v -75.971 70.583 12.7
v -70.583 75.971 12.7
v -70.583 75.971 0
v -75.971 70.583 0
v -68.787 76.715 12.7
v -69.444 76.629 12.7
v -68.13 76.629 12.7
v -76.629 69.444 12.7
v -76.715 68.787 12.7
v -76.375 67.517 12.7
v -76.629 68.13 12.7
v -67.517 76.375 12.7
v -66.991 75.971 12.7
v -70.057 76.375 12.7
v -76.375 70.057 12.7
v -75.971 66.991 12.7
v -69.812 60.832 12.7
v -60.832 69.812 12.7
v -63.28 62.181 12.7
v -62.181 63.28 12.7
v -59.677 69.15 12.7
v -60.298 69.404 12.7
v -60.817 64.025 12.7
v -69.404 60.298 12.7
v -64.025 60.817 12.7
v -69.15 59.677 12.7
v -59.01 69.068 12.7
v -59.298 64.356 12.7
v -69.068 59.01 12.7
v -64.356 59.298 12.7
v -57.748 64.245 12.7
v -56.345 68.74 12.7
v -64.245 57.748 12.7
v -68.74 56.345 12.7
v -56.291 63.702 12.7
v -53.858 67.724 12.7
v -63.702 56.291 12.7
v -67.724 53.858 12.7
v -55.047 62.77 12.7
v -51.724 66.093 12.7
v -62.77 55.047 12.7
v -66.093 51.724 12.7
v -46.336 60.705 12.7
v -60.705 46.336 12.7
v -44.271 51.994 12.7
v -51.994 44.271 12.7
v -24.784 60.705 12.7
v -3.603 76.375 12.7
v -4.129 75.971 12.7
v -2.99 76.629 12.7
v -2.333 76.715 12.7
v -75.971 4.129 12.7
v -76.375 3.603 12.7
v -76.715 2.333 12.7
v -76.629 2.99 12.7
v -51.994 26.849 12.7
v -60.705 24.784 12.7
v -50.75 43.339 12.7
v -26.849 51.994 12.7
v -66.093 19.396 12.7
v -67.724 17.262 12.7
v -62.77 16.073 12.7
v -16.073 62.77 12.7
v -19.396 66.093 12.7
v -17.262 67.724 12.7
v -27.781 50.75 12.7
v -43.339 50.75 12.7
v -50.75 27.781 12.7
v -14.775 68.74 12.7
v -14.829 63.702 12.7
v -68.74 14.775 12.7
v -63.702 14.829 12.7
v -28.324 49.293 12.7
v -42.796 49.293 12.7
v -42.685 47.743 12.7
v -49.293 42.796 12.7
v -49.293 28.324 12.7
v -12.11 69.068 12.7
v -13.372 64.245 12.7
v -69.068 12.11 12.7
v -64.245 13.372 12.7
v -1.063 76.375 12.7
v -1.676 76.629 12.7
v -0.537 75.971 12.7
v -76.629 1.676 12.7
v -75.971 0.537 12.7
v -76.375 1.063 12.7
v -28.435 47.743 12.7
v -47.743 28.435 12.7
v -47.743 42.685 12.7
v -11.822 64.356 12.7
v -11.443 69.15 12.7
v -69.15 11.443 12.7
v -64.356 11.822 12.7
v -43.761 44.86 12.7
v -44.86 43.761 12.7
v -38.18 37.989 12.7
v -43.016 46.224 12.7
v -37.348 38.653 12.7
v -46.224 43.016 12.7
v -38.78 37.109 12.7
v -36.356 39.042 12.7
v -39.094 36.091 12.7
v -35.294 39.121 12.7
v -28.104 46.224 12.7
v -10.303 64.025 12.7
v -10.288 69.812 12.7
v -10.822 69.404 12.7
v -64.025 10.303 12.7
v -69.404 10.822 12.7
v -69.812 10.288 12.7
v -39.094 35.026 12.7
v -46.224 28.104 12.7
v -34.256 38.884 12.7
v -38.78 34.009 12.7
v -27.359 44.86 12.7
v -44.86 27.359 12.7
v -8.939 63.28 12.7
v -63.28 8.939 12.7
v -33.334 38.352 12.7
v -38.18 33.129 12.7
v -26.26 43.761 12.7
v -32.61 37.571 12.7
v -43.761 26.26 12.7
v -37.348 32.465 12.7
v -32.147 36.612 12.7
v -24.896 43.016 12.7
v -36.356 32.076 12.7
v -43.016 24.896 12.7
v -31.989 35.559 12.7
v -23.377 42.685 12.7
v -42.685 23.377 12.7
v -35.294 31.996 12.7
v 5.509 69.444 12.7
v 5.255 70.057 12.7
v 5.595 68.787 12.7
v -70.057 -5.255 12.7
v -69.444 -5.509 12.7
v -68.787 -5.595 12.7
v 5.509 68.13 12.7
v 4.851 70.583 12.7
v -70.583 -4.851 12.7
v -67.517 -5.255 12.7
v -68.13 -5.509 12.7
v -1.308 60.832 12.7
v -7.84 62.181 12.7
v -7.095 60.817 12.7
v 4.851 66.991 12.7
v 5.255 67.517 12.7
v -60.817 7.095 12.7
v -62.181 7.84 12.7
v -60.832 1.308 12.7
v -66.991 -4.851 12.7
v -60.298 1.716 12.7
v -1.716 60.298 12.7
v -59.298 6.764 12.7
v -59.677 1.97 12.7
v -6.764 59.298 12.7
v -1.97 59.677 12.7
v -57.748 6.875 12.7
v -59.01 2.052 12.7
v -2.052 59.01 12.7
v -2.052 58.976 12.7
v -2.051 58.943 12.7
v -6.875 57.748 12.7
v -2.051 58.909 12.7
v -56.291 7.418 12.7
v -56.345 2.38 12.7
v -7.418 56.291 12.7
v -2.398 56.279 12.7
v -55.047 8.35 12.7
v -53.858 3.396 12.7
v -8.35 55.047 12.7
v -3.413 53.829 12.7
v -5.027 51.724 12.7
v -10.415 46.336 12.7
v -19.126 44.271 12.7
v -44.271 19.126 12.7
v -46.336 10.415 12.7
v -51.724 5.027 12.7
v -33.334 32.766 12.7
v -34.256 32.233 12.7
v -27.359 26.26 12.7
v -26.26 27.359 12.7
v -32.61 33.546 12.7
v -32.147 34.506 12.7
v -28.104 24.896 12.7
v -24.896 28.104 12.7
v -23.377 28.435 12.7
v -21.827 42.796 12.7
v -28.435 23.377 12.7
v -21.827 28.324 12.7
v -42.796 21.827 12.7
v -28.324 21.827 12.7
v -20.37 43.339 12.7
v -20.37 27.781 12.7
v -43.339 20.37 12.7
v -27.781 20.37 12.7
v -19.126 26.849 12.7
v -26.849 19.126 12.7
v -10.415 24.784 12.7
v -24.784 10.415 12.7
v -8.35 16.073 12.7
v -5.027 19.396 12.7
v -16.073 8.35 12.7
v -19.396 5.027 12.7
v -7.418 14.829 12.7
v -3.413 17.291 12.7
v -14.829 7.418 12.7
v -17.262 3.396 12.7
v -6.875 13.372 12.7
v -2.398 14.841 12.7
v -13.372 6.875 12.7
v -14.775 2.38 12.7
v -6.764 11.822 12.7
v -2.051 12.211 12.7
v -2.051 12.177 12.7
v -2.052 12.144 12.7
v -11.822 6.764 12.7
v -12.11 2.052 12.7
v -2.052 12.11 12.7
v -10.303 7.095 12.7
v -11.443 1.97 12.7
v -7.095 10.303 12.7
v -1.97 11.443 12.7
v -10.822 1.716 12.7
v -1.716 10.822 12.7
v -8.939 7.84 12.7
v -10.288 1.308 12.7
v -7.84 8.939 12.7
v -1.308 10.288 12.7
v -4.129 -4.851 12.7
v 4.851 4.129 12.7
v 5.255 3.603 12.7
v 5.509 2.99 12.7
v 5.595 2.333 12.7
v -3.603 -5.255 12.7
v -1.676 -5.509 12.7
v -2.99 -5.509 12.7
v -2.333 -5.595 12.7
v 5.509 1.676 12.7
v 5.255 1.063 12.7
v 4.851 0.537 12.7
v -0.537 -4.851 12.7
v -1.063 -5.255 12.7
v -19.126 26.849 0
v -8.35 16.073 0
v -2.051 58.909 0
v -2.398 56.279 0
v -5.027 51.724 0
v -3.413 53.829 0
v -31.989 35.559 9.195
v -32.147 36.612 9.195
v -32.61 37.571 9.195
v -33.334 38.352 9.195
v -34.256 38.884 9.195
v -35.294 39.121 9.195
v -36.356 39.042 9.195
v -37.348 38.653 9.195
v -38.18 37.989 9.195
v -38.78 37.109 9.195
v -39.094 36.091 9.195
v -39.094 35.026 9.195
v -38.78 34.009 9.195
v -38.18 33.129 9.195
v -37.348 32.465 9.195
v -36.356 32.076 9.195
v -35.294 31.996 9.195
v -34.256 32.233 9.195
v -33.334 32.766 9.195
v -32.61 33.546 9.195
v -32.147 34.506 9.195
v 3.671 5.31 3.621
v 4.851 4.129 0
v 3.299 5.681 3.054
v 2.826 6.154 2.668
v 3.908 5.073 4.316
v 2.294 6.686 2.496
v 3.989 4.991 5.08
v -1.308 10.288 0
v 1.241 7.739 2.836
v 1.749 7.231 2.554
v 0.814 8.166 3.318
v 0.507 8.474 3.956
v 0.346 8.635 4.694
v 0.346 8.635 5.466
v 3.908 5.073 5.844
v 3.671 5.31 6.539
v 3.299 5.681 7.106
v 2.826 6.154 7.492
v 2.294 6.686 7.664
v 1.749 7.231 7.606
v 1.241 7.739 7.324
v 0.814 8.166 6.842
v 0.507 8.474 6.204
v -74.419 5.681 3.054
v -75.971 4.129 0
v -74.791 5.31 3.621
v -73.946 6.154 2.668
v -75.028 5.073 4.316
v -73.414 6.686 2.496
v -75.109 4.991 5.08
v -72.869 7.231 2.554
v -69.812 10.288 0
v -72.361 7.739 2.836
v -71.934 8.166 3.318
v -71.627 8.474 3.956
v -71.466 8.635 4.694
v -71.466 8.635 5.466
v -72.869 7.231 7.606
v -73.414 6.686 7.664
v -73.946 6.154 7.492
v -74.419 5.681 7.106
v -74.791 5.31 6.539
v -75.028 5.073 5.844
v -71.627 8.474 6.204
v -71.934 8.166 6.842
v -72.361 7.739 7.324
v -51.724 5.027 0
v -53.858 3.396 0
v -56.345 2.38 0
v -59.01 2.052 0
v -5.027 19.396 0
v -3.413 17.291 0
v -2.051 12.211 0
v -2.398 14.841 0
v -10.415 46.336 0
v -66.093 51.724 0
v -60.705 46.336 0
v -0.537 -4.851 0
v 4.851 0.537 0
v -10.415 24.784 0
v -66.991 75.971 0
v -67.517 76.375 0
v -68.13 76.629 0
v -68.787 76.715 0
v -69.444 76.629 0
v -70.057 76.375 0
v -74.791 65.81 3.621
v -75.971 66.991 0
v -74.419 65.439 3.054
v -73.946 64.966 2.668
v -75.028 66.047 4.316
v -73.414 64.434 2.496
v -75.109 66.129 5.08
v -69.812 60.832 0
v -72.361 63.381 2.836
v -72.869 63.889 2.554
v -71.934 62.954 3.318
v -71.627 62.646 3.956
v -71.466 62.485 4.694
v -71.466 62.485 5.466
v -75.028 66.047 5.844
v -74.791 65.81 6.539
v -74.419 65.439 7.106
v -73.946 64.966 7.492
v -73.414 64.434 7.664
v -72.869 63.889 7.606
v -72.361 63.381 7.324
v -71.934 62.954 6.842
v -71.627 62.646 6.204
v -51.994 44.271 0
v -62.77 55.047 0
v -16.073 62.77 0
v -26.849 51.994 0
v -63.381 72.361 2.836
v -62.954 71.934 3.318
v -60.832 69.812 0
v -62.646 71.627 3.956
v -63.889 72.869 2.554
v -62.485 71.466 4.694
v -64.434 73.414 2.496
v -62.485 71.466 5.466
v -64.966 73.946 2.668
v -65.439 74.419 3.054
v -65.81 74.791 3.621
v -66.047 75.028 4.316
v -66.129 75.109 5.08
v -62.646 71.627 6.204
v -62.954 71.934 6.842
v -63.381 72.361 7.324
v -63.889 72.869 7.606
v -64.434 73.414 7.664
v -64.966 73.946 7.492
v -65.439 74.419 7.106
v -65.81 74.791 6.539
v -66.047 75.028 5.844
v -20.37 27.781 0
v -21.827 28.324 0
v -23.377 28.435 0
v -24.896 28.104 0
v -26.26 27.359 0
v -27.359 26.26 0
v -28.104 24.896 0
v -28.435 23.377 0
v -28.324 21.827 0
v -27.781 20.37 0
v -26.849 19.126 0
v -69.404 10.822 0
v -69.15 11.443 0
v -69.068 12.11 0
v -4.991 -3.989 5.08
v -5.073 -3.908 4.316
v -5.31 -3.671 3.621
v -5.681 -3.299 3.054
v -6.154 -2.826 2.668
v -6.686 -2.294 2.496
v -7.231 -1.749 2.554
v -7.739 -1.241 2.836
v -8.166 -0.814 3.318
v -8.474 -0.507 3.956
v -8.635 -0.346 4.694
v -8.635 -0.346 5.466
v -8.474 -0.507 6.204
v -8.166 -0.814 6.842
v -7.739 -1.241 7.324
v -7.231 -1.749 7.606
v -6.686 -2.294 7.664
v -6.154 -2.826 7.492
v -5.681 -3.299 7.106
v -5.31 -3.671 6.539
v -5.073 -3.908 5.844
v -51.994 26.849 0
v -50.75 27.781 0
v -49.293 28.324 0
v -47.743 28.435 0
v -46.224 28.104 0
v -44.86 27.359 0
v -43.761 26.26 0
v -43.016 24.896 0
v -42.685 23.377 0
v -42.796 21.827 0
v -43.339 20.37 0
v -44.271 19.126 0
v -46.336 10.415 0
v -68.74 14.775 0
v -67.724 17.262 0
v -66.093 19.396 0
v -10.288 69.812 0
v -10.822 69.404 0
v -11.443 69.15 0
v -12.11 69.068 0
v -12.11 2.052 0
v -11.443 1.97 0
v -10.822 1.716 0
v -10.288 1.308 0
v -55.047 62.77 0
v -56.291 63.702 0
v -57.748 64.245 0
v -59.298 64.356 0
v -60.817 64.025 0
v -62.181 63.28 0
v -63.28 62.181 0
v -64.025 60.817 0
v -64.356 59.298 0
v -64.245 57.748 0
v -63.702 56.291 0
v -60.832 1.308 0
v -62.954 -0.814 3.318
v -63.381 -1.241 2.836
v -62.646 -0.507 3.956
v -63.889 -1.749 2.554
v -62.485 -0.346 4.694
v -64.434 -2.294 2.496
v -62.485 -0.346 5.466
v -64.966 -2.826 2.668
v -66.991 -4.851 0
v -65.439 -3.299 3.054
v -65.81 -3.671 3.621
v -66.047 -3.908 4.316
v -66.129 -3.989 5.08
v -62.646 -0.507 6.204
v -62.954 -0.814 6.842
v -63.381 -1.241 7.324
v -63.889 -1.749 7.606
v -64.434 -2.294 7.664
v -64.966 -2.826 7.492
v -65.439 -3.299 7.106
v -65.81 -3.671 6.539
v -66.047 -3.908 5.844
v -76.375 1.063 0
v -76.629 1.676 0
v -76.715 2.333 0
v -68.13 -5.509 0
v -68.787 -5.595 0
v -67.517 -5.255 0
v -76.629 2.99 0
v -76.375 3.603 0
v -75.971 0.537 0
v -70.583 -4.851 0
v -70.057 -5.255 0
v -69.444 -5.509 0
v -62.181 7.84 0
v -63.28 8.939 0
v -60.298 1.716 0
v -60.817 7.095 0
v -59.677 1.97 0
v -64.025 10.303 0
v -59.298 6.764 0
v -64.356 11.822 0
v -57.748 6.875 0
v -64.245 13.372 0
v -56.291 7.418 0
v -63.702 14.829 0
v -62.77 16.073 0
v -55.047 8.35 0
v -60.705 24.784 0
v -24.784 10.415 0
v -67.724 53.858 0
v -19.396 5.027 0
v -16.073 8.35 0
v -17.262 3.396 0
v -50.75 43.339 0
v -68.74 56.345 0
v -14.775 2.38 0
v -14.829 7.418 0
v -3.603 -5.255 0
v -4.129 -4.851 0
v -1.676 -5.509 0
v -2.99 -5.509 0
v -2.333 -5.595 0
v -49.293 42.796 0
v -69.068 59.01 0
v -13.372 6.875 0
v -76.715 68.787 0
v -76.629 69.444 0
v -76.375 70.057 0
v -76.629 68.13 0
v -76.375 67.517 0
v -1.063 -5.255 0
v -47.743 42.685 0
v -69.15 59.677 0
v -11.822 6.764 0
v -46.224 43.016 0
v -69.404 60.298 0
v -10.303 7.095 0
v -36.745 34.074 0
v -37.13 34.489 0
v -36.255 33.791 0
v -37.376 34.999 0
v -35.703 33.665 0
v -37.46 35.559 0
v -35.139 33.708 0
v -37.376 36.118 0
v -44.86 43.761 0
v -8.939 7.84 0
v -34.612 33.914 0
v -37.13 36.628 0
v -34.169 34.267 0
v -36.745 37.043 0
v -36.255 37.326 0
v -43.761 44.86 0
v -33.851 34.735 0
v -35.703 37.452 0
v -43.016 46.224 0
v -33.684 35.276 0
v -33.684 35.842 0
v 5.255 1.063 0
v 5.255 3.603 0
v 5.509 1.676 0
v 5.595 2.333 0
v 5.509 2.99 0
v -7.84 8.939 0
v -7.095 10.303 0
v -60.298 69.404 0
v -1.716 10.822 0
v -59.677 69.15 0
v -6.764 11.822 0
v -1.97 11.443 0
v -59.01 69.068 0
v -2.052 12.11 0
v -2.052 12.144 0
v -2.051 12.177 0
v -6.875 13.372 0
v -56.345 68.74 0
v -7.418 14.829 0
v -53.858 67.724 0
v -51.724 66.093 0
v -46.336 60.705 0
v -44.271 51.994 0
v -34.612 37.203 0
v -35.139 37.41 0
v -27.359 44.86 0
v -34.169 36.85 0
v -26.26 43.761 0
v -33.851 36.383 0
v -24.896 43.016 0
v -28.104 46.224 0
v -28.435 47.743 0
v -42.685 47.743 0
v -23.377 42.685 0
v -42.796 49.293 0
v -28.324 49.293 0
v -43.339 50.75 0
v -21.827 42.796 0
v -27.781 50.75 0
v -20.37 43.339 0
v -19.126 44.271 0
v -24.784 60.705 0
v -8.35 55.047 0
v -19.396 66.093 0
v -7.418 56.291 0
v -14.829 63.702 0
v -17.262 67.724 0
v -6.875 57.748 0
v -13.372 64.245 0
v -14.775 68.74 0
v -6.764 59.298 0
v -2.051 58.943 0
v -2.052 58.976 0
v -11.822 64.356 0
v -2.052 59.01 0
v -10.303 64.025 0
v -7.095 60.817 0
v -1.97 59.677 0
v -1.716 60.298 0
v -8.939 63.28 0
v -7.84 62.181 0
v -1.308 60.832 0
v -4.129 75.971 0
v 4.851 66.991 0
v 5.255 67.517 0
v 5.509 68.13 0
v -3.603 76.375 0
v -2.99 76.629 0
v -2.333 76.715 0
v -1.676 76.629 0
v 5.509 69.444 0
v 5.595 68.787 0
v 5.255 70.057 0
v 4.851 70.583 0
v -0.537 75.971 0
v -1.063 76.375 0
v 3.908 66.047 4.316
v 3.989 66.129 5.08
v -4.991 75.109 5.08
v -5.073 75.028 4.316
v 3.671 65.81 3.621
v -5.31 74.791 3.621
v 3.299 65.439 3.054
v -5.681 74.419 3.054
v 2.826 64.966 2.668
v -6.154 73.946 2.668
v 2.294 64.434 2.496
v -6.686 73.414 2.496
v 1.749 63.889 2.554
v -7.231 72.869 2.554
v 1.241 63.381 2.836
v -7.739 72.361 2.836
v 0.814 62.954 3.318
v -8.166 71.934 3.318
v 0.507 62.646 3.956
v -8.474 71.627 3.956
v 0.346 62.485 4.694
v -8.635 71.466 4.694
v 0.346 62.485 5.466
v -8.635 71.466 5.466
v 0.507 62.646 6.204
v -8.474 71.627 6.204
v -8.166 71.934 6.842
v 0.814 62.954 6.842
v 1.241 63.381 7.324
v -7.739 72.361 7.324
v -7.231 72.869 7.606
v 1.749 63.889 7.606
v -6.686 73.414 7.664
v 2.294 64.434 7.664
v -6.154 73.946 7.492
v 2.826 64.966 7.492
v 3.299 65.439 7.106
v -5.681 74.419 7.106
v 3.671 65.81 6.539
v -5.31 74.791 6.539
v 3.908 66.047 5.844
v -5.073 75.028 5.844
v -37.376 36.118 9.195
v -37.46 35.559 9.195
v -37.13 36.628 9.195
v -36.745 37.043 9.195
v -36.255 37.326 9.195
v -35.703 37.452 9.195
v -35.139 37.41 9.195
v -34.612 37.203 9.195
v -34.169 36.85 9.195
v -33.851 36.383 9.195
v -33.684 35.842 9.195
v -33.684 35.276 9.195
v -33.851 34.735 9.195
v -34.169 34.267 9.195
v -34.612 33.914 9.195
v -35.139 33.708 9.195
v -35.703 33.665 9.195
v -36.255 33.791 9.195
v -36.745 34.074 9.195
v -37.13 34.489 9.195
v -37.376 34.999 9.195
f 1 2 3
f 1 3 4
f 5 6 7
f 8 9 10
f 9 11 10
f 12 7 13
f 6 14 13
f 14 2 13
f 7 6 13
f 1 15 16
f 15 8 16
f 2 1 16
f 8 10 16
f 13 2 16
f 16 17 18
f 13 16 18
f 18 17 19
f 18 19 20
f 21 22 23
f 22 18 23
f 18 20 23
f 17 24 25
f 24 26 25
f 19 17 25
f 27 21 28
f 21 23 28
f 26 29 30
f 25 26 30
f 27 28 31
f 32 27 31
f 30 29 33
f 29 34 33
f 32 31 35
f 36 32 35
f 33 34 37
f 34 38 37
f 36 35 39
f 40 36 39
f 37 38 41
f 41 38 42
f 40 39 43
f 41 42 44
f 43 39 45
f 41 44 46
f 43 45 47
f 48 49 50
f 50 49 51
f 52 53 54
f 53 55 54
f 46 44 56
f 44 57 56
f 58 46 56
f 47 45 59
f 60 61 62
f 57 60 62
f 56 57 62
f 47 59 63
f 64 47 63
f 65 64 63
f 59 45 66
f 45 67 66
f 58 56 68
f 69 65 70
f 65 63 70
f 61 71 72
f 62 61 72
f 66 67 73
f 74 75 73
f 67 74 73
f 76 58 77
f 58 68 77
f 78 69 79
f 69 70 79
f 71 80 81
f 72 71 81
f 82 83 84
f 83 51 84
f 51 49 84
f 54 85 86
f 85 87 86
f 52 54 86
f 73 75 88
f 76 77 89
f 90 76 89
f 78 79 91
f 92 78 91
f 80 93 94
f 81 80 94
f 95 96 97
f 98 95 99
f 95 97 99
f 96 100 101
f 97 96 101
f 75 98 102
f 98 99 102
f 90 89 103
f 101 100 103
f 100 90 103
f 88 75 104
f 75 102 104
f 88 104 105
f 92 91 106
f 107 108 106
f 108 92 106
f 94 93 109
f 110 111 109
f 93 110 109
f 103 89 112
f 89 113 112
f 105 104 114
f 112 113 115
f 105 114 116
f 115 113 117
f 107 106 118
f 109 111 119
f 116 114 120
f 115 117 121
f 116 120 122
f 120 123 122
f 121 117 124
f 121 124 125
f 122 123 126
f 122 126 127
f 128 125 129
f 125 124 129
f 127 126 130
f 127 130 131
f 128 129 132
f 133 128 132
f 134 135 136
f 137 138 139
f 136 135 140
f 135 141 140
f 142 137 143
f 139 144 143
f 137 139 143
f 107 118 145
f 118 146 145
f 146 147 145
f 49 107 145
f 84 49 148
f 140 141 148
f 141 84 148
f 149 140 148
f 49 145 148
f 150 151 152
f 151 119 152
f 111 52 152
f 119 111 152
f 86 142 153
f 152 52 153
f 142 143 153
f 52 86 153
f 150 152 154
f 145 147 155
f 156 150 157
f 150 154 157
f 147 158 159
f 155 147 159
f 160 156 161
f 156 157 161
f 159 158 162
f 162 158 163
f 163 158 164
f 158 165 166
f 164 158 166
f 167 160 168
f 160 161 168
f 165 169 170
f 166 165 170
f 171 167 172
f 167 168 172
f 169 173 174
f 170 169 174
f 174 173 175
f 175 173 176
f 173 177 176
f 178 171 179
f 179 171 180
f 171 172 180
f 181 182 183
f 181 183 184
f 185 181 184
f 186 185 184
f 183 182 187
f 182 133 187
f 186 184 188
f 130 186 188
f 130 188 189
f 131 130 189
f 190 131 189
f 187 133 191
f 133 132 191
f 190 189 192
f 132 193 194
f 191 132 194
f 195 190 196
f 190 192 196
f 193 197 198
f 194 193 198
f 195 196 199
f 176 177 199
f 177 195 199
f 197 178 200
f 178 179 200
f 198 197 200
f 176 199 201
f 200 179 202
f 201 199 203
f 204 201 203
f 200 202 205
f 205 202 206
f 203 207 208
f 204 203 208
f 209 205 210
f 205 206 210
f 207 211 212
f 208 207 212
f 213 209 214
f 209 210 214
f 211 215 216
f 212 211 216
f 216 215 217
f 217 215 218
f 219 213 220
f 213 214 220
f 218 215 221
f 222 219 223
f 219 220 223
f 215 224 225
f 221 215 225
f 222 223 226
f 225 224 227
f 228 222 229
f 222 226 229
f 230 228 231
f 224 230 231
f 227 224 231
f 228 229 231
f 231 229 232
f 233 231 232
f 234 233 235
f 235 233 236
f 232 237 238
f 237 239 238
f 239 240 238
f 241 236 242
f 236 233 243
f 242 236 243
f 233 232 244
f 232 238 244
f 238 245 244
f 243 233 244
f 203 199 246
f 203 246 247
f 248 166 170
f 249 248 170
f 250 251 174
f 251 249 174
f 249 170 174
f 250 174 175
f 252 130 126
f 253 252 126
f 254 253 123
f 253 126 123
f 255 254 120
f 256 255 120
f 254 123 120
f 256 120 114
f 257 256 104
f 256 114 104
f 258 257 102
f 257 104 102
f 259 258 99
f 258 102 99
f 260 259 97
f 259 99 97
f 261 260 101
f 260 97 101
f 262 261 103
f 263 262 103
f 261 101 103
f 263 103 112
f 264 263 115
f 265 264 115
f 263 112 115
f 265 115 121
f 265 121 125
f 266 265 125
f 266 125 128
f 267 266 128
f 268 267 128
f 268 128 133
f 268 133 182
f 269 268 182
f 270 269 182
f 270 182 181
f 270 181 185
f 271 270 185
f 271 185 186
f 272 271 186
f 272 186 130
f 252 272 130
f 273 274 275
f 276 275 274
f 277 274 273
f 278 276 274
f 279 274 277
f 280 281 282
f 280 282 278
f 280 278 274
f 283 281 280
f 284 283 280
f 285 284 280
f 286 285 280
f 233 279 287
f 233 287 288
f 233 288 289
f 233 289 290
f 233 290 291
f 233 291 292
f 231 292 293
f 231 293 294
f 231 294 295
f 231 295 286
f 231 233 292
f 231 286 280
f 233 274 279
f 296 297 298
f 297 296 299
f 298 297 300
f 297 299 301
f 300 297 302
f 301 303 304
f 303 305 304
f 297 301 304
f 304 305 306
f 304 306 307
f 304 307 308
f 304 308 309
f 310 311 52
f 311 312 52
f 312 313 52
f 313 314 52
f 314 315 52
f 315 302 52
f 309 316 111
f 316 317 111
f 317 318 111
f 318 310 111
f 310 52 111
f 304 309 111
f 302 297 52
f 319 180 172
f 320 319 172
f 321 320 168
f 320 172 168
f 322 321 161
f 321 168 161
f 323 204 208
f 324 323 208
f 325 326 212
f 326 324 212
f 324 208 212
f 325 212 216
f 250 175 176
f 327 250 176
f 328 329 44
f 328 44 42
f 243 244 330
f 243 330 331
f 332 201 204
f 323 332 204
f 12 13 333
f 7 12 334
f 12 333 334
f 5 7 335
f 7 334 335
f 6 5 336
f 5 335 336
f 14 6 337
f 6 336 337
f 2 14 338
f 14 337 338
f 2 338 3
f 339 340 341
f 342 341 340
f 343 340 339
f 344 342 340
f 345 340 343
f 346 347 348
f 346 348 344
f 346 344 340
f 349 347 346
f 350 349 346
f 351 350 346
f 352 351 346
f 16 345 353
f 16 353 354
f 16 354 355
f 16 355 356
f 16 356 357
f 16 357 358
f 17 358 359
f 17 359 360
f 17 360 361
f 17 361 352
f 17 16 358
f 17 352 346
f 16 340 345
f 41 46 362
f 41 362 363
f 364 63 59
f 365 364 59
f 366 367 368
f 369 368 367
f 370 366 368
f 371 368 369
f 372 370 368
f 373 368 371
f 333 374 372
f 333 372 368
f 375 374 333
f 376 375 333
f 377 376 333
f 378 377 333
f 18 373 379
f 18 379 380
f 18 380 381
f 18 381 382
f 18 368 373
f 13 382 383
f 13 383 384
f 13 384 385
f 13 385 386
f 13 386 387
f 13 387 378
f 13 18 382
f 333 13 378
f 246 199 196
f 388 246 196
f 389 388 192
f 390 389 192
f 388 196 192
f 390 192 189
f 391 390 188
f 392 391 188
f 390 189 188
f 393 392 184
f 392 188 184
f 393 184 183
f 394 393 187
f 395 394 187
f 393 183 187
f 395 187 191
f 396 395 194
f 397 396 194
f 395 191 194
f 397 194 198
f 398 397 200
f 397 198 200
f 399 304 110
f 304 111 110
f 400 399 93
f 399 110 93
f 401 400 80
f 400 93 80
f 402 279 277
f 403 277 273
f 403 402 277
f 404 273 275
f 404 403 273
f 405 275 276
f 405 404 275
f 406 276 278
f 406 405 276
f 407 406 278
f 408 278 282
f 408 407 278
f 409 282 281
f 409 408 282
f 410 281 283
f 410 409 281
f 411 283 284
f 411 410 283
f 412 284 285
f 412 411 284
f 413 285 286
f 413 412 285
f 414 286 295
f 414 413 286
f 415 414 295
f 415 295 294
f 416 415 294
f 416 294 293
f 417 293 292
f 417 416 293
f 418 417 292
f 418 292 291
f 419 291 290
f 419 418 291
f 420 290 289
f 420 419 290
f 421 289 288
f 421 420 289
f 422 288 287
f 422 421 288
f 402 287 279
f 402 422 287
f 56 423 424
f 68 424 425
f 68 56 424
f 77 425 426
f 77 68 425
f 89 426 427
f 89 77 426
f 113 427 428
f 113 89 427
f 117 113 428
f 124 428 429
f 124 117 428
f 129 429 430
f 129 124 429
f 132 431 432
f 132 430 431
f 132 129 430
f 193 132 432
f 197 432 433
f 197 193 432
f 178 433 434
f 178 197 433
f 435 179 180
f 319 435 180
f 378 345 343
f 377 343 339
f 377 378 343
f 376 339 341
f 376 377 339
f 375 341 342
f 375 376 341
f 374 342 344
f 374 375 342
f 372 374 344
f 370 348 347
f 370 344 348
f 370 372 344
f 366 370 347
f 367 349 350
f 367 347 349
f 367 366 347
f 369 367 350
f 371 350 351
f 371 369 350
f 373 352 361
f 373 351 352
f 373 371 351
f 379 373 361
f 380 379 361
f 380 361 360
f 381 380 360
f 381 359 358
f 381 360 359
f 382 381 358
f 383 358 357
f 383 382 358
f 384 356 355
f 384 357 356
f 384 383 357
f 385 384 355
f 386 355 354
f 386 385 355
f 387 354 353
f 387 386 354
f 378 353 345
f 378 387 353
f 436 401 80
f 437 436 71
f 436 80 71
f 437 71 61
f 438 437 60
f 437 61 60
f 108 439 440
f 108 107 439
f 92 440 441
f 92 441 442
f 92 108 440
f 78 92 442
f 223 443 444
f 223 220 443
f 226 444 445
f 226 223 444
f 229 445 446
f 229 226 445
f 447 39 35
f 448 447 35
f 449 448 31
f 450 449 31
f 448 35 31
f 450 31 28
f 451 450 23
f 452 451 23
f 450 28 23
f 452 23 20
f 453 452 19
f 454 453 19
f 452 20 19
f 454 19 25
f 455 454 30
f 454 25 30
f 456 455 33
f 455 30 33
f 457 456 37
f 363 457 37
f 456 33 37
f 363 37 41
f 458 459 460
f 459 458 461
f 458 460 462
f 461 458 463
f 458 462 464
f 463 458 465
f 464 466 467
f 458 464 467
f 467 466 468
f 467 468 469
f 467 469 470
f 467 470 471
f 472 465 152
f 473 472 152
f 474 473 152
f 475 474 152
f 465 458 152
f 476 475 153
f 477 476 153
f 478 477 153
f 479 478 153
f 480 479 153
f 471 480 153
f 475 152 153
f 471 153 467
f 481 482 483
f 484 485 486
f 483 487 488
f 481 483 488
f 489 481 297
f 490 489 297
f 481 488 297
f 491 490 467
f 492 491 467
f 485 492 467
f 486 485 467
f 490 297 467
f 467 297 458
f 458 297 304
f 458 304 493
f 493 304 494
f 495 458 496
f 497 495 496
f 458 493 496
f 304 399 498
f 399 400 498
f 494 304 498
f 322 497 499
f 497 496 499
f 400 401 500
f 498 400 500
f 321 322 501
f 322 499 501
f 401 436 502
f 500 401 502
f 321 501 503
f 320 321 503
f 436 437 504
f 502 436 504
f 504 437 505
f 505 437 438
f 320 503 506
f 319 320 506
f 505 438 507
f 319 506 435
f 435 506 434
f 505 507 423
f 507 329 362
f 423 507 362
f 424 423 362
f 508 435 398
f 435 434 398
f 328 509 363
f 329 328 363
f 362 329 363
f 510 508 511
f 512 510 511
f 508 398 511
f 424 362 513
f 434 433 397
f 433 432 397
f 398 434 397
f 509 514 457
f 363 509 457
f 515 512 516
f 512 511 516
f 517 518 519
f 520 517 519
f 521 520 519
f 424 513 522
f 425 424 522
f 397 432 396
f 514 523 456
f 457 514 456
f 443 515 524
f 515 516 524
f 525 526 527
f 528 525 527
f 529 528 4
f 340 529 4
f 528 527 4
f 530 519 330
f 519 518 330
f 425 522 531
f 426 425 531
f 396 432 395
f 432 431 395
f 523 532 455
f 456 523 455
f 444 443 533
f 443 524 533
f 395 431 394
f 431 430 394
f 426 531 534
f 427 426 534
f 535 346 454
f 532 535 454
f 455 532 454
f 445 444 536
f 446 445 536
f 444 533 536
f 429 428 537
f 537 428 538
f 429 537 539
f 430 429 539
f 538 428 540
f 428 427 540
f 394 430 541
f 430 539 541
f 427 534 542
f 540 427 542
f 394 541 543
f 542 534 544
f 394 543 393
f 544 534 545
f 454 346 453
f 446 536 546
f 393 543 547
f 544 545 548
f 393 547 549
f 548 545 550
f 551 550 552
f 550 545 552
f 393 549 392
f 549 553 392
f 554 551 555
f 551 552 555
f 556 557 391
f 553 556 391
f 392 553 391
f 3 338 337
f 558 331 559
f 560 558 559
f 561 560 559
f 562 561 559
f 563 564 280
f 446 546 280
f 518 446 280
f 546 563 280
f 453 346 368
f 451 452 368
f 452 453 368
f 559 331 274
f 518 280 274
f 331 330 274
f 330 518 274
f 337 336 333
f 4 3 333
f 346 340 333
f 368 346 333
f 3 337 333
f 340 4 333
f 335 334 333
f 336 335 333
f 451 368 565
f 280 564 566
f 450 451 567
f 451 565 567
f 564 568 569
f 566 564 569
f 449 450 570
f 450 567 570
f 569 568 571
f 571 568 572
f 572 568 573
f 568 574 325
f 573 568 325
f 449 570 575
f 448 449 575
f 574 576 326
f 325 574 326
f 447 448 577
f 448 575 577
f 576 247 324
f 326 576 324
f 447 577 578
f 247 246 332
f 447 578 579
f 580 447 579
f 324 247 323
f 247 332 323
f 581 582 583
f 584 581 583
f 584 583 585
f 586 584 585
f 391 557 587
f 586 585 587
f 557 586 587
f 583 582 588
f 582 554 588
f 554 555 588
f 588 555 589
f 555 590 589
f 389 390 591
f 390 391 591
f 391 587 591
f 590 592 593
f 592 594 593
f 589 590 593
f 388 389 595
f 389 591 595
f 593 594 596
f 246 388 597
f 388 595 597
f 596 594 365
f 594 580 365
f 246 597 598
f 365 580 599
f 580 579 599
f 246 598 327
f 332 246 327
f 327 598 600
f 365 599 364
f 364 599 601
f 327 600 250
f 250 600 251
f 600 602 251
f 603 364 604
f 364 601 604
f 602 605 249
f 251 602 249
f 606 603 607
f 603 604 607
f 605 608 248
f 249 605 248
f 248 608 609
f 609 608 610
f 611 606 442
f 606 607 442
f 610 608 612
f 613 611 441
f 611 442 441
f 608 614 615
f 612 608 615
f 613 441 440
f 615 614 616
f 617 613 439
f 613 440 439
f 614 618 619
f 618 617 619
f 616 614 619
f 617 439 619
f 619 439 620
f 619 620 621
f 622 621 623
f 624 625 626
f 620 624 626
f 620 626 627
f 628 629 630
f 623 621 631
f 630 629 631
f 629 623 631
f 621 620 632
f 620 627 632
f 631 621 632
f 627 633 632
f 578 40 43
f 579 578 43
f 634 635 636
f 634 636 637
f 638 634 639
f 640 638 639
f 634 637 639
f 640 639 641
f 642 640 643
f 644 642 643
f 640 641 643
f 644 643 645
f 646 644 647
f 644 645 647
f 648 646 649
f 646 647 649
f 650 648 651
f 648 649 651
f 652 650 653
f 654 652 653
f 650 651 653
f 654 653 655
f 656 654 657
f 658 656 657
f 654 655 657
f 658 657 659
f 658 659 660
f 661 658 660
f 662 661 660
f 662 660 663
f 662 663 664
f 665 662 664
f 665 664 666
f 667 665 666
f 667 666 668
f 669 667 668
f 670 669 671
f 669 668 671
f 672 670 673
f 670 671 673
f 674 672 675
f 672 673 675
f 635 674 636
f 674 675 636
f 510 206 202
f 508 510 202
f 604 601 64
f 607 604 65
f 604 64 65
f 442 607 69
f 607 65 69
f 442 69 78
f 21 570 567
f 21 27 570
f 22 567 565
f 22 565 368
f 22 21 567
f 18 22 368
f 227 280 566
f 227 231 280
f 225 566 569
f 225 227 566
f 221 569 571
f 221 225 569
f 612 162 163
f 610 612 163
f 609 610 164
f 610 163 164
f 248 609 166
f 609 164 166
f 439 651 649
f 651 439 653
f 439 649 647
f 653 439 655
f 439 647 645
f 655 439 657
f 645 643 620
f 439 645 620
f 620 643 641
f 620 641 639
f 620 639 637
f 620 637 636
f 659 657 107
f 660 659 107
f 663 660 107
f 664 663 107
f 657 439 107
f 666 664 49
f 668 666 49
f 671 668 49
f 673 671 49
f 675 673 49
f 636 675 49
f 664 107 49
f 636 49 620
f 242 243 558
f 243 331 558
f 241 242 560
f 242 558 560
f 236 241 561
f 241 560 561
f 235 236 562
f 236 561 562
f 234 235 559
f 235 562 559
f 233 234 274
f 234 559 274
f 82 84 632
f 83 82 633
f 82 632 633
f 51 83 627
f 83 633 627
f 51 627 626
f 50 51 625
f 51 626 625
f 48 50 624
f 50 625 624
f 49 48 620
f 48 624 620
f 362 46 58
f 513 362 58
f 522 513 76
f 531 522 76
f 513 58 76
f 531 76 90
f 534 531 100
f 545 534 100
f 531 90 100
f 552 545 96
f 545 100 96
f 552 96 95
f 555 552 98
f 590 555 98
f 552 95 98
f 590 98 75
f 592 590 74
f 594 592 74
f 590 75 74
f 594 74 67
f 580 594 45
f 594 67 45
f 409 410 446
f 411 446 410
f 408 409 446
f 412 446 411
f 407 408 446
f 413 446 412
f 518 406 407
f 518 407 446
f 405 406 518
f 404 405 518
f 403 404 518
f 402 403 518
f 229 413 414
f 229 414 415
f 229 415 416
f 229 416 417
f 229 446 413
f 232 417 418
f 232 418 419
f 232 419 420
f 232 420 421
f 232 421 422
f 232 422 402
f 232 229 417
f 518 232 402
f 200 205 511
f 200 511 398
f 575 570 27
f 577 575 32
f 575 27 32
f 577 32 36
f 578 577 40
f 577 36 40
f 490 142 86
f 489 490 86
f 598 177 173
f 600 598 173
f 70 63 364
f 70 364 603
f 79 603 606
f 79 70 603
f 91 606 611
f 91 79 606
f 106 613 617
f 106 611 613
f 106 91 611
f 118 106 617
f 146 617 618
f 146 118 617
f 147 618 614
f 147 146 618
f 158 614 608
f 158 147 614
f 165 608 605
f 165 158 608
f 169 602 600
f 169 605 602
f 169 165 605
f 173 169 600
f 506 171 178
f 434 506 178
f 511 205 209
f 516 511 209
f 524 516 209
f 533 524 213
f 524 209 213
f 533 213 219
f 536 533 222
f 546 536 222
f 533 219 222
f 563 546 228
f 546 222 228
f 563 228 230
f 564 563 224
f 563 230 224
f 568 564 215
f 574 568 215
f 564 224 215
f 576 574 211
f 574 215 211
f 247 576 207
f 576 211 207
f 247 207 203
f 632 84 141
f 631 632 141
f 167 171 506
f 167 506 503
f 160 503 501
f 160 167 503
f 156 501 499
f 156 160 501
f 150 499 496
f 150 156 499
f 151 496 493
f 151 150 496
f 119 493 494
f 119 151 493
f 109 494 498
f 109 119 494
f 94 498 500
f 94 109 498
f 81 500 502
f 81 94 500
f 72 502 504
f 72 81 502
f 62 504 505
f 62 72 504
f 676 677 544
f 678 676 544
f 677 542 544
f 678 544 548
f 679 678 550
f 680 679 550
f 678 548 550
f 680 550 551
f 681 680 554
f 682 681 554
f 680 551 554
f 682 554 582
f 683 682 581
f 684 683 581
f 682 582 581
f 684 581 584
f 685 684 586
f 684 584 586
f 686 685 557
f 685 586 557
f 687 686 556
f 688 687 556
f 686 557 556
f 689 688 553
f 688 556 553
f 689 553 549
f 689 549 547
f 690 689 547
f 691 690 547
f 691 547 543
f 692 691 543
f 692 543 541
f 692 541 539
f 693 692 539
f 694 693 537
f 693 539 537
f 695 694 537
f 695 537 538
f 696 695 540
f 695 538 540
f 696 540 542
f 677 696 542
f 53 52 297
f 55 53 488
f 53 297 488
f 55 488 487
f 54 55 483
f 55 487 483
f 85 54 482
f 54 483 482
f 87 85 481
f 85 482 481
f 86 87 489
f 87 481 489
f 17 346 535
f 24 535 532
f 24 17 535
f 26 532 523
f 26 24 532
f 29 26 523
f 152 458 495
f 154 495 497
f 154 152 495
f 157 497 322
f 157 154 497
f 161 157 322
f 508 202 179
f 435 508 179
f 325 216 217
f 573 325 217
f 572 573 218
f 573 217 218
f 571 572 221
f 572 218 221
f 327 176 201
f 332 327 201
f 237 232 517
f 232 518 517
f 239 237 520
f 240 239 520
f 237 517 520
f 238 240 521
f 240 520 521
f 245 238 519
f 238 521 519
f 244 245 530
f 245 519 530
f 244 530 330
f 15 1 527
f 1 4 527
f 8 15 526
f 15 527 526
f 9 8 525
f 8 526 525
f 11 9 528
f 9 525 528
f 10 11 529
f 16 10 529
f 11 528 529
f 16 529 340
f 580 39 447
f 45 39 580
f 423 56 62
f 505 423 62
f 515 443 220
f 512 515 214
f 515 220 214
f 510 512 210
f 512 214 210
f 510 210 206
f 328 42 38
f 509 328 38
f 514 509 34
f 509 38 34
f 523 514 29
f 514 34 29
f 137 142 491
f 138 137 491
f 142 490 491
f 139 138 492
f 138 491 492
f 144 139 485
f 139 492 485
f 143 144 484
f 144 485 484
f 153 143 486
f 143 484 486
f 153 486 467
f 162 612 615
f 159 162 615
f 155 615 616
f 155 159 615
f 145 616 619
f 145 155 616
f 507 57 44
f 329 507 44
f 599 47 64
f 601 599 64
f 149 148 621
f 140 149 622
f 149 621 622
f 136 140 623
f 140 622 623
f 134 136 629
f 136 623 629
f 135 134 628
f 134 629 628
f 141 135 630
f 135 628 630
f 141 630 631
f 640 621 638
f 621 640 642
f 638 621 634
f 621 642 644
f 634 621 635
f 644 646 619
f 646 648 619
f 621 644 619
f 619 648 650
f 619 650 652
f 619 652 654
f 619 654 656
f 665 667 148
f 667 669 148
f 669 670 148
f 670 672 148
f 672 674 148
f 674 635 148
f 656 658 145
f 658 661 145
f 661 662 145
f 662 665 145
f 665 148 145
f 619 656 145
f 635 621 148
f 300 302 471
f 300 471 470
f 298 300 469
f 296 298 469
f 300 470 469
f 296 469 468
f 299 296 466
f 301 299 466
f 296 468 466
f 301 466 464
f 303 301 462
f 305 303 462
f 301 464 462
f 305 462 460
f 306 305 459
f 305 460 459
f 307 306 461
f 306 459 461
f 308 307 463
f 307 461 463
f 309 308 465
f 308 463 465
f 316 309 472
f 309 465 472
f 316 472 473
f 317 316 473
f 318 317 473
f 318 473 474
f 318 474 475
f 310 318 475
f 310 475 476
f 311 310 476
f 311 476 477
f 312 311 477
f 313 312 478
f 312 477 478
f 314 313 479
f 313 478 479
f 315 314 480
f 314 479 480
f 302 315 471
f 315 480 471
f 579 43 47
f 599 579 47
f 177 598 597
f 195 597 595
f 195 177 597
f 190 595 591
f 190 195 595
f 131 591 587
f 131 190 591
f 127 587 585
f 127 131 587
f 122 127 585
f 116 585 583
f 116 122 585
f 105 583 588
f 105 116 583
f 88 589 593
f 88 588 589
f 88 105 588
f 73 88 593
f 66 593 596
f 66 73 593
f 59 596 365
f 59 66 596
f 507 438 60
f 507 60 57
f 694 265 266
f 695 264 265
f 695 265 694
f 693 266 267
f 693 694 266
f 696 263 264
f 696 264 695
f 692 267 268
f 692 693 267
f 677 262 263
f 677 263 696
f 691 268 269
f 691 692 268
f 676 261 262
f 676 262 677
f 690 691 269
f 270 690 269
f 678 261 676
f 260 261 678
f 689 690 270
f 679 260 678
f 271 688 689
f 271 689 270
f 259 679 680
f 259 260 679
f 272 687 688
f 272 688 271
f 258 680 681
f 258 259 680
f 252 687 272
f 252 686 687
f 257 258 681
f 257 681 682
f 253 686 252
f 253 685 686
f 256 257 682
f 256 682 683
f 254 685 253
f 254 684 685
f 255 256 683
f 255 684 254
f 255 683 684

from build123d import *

# Parameters (mm, degrees)
SKETCH1_W                                      = 71.12
SKETCH1_H                                      = 71.12
EXTRUDE1_DEPTH                                 = 12.7
SKETCH3_R                                      = 2.921
CUT_EXTRUDE1_DEPTH                             = 102.377506381
MIRROR3_COPY_1_SKETCH_R                        = 2.921
MIRROR3_COPY_1_DEPTH                           = 102.377506381
MIRROR3_COPY_2_SKETCH_R                        = 2.921
MIRROR3_COPY_2_DEPTH                           = 102.377506381
SKETCH6_R                                      = 5.461
CUT_EXTRUDE3_DEPTH                             = 102.377506381
MIRROR6_COPY_1_SKETCH_R                        = 5.461
MIRROR6_COPY_1_DEPTH                           = 102.377506381
MIRROR6_COPY_2_SKETCH_R                        = 5.461
MIRROR6_COPY_2_DEPTH                           = 102.377506381
SKETCH7_W                                      = 71.12
SKETCH7_H                                      = 71.12
CUT_EXTRUDE5_DEPTH                             = 102.377506381
EXTRUDE2_DEPTH                                 = 12.7
CBORE_FOR_6_SOCKET_HEAD_CAP_SCREW1_D           = 3.7973
CBORE_FOR_6_SOCKET_HEAD_CAP_SCREW1_CBORE_D     = 7.14502
CBORE_FOR_6_SOCKET_HEAD_CAP_SCREW1_CBORE_DEPTH = 3.5052
MIRROR9_COPY_1_DEPTH                           = 12.7
FILLET3_R                                      = 2.54


with BuildPart() as part:
    # Sketch1 → Extrude1 (new body)
    with BuildSketch(Plane.XY):
        with Locations((-35.56, 35.56)):
            Rectangle(SKETCH1_W, SKETCH1_H)
    extrude(amount=EXTRUDE1_DEPTH)

    # Sketch3 → Cut-Extrude1 (cut, through all)
    with BuildSketch(Plane.XY.offset(12.7)):
        with Locations((-58.908665915, 58.908665915)):
            Circle(SKETCH3_R)
        with Locations((-48.132358569, 48.132358569)):
            Circle(SKETCH3_R)
        Polygon((-58.908665915, 58.908665915), (-56.843207007, 60.974124823), (-46.066899662, 50.197817477), (-50.197817477, 46.066899662), (-60.974124823, 56.843207007), align=None)
    cut_extrude1 = extrude(amount=-CUT_EXTRUDE1_DEPTH, mode=Mode.SUBTRACT)

    # Mirror1: Cut-Extrude1 across plane
    add(cut_extrude1.mirror(Plane.ZX.offset(35.56)), mode=Mode.SUBTRACT)

    # Mirror2: Cut-Extrude1 across plane
    add(cut_extrude1.mirror(Plane(origin=(-35.56, 0, 0), x_dir=(0, 0, 1), z_dir=(1, 0, 0))), mode=Mode.SUBTRACT)

    # Mirror3 copy 1 sketch → Mirror3 copy 1 (cut, through all)
    with BuildSketch(Plane(origin=(-71.12, 71.12, 12.7), x_dir=(-1, 0, 0), z_dir=(0, 0, 1))):
        with Locations((-58.908665915, 58.908665915)):
            Circle(MIRROR3_COPY_1_SKETCH_R)
        with Locations((-48.132358569, 48.132358569)):
            Circle(MIRROR3_COPY_1_SKETCH_R)
        Polygon((-58.908665915, 58.908665915), (-56.843207007, 60.974124823), (-46.066899662, 50.197817477), (-50.197817477, 46.066899662), (-60.974124823, 56.843207007), align=None)
    extrude(amount=-MIRROR3_COPY_1_DEPTH, mode=Mode.SUBTRACT)

    # Mirror3 copy 2 sketch → Mirror3 copy 2 (cut, through all)
    with BuildSketch(Plane(origin=(0, 71.12, 12.7), x_dir=(1, 0, 0), z_dir=(0, 0, 1))):
        with Locations((-58.908665915, -58.908665915)):
            Circle(MIRROR3_COPY_2_SKETCH_R)
        with Locations((-48.132358569, -48.132358569)):
            Circle(MIRROR3_COPY_2_SKETCH_R)
        Polygon((-58.908665915, -58.908665915), (-56.843207007, -60.974124823), (-46.066899662, -50.197817477), (-50.197817477, -46.066899662), (-60.974124823, -56.843207007), align=None)
    extrude(amount=-MIRROR3_COPY_2_DEPTH, mode=Mode.SUBTRACT)

    # Sketch6 → Cut-Extrude3 (cut, through all)
    with BuildSketch(Plane.XY.offset(12.7)):
        with Locations((-58.908665915, 58.908665915)):
            Circle(SKETCH6_R)
        with Locations((-48.132358569, 48.132358569)):
            Circle(SKETCH6_R)
        Polygon((-58.908665915, 58.908665915), (-55.047155783, 62.770176047), (-44.270848437, 51.993868702), (-48.132358569, 48.132358569), (-51.993868702, 44.270848437), (-62.770176047, 55.047155783), align=None)
    cut_extrude3 = extrude(amount=-CUT_EXTRUDE3_DEPTH, mode=Mode.SUBTRACT)

    # Mirror4: Cut-Extrude3 across plane
    add(cut_extrude3.mirror(Plane(origin=(-35.56, 0, 0), x_dir=(0, 0, 1), z_dir=(1, 0, 0))), mode=Mode.SUBTRACT)

    # Mirror5: Cut-Extrude3 across plane
    add(cut_extrude3.mirror(Plane.ZX.offset(35.56)), mode=Mode.SUBTRACT)

    # Mirror6 copy 1 sketch → Mirror6 copy 1 (cut, through all)
    with BuildSketch(Plane(origin=(-71.12, 71.12, 12.7), x_dir=(-1, 0, 0), z_dir=(0, 0, 1))):
        with Locations((-58.908665915, 58.908665915)):
            Circle(MIRROR6_COPY_1_SKETCH_R)
        with Locations((-48.132358569, 48.132358569)):
            Circle(MIRROR6_COPY_1_SKETCH_R)
        Polygon((-58.908665915, 58.908665915), (-55.047155783, 62.770176047), (-44.270848437, 51.993868702), (-48.132358569, 48.132358569), (-51.993868702, 44.270848437), (-62.770176047, 55.047155783), align=None)
    extrude(amount=-MIRROR6_COPY_1_DEPTH, mode=Mode.SUBTRACT)

    # Mirror6 copy 2 sketch → Mirror6 copy 2 (cut, through all)
    with BuildSketch(Plane(origin=(-71.12, 0, 12.7), x_dir=(-1, 0, 0), z_dir=(0, 0, 1))):
        with Locations((-58.908665915, -58.908665915)):
            Circle(MIRROR6_COPY_2_SKETCH_R)
        with Locations((-48.132358569, -48.132358569)):
            Circle(MIRROR6_COPY_2_SKETCH_R)
        Polygon((-58.908665915, -58.908665915), (-55.047155783, -62.770176047), (-44.270848437, -51.993868702), (-48.132358569, -48.132358569), (-51.993868702, -44.270848437), (-62.770176047, -55.047155783), align=None)
    extrude(amount=-MIRROR6_COPY_2_DEPTH, mode=Mode.SUBTRACT)

    # Sketch7 → Cut-Extrude5 (cut, through all)
    with BuildSketch(Plane.XY.offset(12.7)):
        with Locations((-35.56, 35.56)):
            Rectangle(SKETCH7_W, SKETCH7_H)
        with BuildLine():
            Line((-10.415282861, 24.783692655), (-5.027129188, 19.395538982))
            ThreePointArc((-5.027129188, 19.395538982), (-2.824718035, 16.099397758), (-2.051334085, 12.211334085))
            ThreePointArc((-2.051334085, 12.211334085), (-8.323270412, 2.824718035), (-19.395538982, 5.027129188))
            Line((-19.395538982, 5.027129188), (-24.783692655, 10.415282861))
            Line((-24.783692655, 10.415282861), (-46.336307345, 10.415282861))
            Line((-46.336307345, 10.415282861), (-51.724461018, 5.027129188))
            ThreePointArc((-51.724461018, 5.027129188), (-66.092870812, 5.027129188), (-66.092870812, 19.395538982))
            Line((-66.092870812, 19.395538982), (-60.704717139, 24.783692655))
            Line((-60.704717139, 24.783692655), (-60.704717139, 46.336307345))
            Line((-60.704717139, 46.336307345), (-66.092870812, 51.724461018))
            ThreePointArc((-66.092870812, 51.724461018), (-66.092870812, 66.092870812), (-51.724461018, 66.092870812))
            Line((-51.724461018, 66.092870812), (-46.336307345, 60.704717139))
            Line((-46.336307345, 60.704717139), (-24.783692655, 60.704717139))
            Line((-24.783692655, 60.704717139), (-19.395538982, 66.092870812))
            ThreePointArc((-19.395538982, 66.092870812), (-8.323270412, 68.295281965), (-2.051334085, 58.908665915))
            ThreePointArc((-2.051334085, 58.908665915), (-2.824718035, 55.020602242), (-5.027129188, 51.724461018))
            Line((-5.027129188, 51.724461018), (-10.415282861, 46.336307345))
            Line((-10.415282861, 46.336307345), (-10.415282861, 24.783692655))
        make_face(mode=Mode.SUBTRACT)
    extrude(amount=-CUT_EXTRUDE5_DEPTH, mode=Mode.SUBTRACT)

    # Sketch10 → Extrude2 (add)
    with BuildSketch(Plane.XY.offset(12.7)):
        Polygon((-68.786947648, 59.806691527), (-59.806691527, 68.786947648), (-68.786947648, 77.767203769), (-77.767203769, 68.786947648), align=None)
    extrude2 = extrude(amount=-EXTRUDE2_DEPTH)

    # CBORE for #6 Socket Head Cap Screw1 (through all)
    with Locations(Plane(origin=(-35.561282861, 35.558717139, 12.7), x_dir=(1, 0, 0), z_dir=(0, 0, 1))):
        with Locations((0, 0)):
            CounterBoreHole(CBORE_FOR_6_SOCKET_HEAD_CAP_SCREW1_D / 2, CBORE_FOR_6_SOCKET_HEAD_CAP_SCREW1_CBORE_D / 2, CBORE_FOR_6_SOCKET_HEAD_CAP_SCREW1_CBORE_DEPTH)

    # Sketch15 → #6 (0.204) Diameter Hole1 (revolve, cut)
    with BuildSketch(Plane(origin=(-64.296819587, 73.277075708, 5.08), x_dir=(-0.7071067811865476, 0.7071067811865476, 0), z_dir=(0, 0, 1))):
        Polygon((0, 0), (0, 67.596709692), (2.5908, 66.04), (2.5908, 0), align=None)
    f_6_0_204_diameter_hole1 = revolve(axis=Axis((-59.806691527, 77.767203769, 5.08), (-0.7071067811865476, -0.7071067811865476, 0)), mode=Mode.SUBTRACT)

    # Mirror8: Extrude2, #6 (0.204) Diameter Hole1 across plane
    add(extrude2.mirror(Plane.ZX.offset(35.56)))
    add(f_6_0_204_diameter_hole1.mirror(Plane.ZX.offset(35.56)), mode=Mode.SUBTRACT)

    # Mirror9: Extrude2, #6 (0.204) Diameter Hole1 across plane
    add(extrude2.mirror(Plane(origin=(-35.56, 0, 0), x_dir=(0, 0, 1), z_dir=(1, 0, 0))))
    add(f_6_0_204_diameter_hole1.mirror(Plane(origin=(-35.56, 0, 0), x_dir=(0, 0, 1), z_dir=(1, 0, 0))), mode=Mode.SUBTRACT)

    # Mirror9 copy 1 sketch → Mirror9 copy 1 (add)
    with BuildSketch(Plane(origin=(-71.12, 71.12, 12.7), x_dir=(-1, 0, 0), z_dir=(0, 0, 1))):
        Polygon((-68.786947648, 59.806691527), (-59.806691527, 68.786947648), (-68.786947648, 77.767203769), (-77.767203769, 68.786947648), align=None)
    extrude(amount=-MIRROR9_COPY_1_DEPTH)

    # Mirror9 copy 2 sketch → Mirror9 copy 2 (revolve, cut)
    with BuildSketch(Plane(origin=(-6.823180413, -2.157075708, 5.08), x_dir=(0.7071067811865476, -0.7071067811865476, 0), z_dir=(0, 0, 1))):
        Polygon((0, 0), (0, 67.596709692), (2.5908, 66.04), (2.5908, 0), align=None)
    revolve(axis=Axis((-11.313308473, -6.647203769, 5.08), (0.7071067811865476, 0.7071067811865476, 0)), mode=Mode.SUBTRACT)

    # Fillet3
    fillet3_edges = [part.edges().sort_by_distance(p)[0] for p in [
        (-2.113037875, 11.093293996, 6.35),
        (-11.093293996, 2.113037875, 6.35),
        (-60.026706004, 2.113037875, 6.35),
        (-69.006962125, 11.093293996, 6.35),
        (-69.006962125, 60.026706004, 6.35),
        (-60.026706004, 69.006962125, 6.35),
        (-11.093293996, 69.006962125, 6.35),
        (-2.113037875, 60.026706004, 6.35),
        (6.647203769, 2.333052352, 6.35),
        (-2.333052352, -6.647203769, 6.35),
        (-68.786947648, -6.647203769, 6.35),
        (-77.767203769, 2.333052352, 6.35),
        (-77.767203769, 68.786947648, 6.35),
        (-68.786947648, 77.767203769, 6.35),
        (-2.333052352, 77.767203769, 6.35),
        (6.647203769, 68.786947648, 6.35),
    ]]
    fillet(fillet3_edges, radius=FILLET3_R)


solid = part.part
